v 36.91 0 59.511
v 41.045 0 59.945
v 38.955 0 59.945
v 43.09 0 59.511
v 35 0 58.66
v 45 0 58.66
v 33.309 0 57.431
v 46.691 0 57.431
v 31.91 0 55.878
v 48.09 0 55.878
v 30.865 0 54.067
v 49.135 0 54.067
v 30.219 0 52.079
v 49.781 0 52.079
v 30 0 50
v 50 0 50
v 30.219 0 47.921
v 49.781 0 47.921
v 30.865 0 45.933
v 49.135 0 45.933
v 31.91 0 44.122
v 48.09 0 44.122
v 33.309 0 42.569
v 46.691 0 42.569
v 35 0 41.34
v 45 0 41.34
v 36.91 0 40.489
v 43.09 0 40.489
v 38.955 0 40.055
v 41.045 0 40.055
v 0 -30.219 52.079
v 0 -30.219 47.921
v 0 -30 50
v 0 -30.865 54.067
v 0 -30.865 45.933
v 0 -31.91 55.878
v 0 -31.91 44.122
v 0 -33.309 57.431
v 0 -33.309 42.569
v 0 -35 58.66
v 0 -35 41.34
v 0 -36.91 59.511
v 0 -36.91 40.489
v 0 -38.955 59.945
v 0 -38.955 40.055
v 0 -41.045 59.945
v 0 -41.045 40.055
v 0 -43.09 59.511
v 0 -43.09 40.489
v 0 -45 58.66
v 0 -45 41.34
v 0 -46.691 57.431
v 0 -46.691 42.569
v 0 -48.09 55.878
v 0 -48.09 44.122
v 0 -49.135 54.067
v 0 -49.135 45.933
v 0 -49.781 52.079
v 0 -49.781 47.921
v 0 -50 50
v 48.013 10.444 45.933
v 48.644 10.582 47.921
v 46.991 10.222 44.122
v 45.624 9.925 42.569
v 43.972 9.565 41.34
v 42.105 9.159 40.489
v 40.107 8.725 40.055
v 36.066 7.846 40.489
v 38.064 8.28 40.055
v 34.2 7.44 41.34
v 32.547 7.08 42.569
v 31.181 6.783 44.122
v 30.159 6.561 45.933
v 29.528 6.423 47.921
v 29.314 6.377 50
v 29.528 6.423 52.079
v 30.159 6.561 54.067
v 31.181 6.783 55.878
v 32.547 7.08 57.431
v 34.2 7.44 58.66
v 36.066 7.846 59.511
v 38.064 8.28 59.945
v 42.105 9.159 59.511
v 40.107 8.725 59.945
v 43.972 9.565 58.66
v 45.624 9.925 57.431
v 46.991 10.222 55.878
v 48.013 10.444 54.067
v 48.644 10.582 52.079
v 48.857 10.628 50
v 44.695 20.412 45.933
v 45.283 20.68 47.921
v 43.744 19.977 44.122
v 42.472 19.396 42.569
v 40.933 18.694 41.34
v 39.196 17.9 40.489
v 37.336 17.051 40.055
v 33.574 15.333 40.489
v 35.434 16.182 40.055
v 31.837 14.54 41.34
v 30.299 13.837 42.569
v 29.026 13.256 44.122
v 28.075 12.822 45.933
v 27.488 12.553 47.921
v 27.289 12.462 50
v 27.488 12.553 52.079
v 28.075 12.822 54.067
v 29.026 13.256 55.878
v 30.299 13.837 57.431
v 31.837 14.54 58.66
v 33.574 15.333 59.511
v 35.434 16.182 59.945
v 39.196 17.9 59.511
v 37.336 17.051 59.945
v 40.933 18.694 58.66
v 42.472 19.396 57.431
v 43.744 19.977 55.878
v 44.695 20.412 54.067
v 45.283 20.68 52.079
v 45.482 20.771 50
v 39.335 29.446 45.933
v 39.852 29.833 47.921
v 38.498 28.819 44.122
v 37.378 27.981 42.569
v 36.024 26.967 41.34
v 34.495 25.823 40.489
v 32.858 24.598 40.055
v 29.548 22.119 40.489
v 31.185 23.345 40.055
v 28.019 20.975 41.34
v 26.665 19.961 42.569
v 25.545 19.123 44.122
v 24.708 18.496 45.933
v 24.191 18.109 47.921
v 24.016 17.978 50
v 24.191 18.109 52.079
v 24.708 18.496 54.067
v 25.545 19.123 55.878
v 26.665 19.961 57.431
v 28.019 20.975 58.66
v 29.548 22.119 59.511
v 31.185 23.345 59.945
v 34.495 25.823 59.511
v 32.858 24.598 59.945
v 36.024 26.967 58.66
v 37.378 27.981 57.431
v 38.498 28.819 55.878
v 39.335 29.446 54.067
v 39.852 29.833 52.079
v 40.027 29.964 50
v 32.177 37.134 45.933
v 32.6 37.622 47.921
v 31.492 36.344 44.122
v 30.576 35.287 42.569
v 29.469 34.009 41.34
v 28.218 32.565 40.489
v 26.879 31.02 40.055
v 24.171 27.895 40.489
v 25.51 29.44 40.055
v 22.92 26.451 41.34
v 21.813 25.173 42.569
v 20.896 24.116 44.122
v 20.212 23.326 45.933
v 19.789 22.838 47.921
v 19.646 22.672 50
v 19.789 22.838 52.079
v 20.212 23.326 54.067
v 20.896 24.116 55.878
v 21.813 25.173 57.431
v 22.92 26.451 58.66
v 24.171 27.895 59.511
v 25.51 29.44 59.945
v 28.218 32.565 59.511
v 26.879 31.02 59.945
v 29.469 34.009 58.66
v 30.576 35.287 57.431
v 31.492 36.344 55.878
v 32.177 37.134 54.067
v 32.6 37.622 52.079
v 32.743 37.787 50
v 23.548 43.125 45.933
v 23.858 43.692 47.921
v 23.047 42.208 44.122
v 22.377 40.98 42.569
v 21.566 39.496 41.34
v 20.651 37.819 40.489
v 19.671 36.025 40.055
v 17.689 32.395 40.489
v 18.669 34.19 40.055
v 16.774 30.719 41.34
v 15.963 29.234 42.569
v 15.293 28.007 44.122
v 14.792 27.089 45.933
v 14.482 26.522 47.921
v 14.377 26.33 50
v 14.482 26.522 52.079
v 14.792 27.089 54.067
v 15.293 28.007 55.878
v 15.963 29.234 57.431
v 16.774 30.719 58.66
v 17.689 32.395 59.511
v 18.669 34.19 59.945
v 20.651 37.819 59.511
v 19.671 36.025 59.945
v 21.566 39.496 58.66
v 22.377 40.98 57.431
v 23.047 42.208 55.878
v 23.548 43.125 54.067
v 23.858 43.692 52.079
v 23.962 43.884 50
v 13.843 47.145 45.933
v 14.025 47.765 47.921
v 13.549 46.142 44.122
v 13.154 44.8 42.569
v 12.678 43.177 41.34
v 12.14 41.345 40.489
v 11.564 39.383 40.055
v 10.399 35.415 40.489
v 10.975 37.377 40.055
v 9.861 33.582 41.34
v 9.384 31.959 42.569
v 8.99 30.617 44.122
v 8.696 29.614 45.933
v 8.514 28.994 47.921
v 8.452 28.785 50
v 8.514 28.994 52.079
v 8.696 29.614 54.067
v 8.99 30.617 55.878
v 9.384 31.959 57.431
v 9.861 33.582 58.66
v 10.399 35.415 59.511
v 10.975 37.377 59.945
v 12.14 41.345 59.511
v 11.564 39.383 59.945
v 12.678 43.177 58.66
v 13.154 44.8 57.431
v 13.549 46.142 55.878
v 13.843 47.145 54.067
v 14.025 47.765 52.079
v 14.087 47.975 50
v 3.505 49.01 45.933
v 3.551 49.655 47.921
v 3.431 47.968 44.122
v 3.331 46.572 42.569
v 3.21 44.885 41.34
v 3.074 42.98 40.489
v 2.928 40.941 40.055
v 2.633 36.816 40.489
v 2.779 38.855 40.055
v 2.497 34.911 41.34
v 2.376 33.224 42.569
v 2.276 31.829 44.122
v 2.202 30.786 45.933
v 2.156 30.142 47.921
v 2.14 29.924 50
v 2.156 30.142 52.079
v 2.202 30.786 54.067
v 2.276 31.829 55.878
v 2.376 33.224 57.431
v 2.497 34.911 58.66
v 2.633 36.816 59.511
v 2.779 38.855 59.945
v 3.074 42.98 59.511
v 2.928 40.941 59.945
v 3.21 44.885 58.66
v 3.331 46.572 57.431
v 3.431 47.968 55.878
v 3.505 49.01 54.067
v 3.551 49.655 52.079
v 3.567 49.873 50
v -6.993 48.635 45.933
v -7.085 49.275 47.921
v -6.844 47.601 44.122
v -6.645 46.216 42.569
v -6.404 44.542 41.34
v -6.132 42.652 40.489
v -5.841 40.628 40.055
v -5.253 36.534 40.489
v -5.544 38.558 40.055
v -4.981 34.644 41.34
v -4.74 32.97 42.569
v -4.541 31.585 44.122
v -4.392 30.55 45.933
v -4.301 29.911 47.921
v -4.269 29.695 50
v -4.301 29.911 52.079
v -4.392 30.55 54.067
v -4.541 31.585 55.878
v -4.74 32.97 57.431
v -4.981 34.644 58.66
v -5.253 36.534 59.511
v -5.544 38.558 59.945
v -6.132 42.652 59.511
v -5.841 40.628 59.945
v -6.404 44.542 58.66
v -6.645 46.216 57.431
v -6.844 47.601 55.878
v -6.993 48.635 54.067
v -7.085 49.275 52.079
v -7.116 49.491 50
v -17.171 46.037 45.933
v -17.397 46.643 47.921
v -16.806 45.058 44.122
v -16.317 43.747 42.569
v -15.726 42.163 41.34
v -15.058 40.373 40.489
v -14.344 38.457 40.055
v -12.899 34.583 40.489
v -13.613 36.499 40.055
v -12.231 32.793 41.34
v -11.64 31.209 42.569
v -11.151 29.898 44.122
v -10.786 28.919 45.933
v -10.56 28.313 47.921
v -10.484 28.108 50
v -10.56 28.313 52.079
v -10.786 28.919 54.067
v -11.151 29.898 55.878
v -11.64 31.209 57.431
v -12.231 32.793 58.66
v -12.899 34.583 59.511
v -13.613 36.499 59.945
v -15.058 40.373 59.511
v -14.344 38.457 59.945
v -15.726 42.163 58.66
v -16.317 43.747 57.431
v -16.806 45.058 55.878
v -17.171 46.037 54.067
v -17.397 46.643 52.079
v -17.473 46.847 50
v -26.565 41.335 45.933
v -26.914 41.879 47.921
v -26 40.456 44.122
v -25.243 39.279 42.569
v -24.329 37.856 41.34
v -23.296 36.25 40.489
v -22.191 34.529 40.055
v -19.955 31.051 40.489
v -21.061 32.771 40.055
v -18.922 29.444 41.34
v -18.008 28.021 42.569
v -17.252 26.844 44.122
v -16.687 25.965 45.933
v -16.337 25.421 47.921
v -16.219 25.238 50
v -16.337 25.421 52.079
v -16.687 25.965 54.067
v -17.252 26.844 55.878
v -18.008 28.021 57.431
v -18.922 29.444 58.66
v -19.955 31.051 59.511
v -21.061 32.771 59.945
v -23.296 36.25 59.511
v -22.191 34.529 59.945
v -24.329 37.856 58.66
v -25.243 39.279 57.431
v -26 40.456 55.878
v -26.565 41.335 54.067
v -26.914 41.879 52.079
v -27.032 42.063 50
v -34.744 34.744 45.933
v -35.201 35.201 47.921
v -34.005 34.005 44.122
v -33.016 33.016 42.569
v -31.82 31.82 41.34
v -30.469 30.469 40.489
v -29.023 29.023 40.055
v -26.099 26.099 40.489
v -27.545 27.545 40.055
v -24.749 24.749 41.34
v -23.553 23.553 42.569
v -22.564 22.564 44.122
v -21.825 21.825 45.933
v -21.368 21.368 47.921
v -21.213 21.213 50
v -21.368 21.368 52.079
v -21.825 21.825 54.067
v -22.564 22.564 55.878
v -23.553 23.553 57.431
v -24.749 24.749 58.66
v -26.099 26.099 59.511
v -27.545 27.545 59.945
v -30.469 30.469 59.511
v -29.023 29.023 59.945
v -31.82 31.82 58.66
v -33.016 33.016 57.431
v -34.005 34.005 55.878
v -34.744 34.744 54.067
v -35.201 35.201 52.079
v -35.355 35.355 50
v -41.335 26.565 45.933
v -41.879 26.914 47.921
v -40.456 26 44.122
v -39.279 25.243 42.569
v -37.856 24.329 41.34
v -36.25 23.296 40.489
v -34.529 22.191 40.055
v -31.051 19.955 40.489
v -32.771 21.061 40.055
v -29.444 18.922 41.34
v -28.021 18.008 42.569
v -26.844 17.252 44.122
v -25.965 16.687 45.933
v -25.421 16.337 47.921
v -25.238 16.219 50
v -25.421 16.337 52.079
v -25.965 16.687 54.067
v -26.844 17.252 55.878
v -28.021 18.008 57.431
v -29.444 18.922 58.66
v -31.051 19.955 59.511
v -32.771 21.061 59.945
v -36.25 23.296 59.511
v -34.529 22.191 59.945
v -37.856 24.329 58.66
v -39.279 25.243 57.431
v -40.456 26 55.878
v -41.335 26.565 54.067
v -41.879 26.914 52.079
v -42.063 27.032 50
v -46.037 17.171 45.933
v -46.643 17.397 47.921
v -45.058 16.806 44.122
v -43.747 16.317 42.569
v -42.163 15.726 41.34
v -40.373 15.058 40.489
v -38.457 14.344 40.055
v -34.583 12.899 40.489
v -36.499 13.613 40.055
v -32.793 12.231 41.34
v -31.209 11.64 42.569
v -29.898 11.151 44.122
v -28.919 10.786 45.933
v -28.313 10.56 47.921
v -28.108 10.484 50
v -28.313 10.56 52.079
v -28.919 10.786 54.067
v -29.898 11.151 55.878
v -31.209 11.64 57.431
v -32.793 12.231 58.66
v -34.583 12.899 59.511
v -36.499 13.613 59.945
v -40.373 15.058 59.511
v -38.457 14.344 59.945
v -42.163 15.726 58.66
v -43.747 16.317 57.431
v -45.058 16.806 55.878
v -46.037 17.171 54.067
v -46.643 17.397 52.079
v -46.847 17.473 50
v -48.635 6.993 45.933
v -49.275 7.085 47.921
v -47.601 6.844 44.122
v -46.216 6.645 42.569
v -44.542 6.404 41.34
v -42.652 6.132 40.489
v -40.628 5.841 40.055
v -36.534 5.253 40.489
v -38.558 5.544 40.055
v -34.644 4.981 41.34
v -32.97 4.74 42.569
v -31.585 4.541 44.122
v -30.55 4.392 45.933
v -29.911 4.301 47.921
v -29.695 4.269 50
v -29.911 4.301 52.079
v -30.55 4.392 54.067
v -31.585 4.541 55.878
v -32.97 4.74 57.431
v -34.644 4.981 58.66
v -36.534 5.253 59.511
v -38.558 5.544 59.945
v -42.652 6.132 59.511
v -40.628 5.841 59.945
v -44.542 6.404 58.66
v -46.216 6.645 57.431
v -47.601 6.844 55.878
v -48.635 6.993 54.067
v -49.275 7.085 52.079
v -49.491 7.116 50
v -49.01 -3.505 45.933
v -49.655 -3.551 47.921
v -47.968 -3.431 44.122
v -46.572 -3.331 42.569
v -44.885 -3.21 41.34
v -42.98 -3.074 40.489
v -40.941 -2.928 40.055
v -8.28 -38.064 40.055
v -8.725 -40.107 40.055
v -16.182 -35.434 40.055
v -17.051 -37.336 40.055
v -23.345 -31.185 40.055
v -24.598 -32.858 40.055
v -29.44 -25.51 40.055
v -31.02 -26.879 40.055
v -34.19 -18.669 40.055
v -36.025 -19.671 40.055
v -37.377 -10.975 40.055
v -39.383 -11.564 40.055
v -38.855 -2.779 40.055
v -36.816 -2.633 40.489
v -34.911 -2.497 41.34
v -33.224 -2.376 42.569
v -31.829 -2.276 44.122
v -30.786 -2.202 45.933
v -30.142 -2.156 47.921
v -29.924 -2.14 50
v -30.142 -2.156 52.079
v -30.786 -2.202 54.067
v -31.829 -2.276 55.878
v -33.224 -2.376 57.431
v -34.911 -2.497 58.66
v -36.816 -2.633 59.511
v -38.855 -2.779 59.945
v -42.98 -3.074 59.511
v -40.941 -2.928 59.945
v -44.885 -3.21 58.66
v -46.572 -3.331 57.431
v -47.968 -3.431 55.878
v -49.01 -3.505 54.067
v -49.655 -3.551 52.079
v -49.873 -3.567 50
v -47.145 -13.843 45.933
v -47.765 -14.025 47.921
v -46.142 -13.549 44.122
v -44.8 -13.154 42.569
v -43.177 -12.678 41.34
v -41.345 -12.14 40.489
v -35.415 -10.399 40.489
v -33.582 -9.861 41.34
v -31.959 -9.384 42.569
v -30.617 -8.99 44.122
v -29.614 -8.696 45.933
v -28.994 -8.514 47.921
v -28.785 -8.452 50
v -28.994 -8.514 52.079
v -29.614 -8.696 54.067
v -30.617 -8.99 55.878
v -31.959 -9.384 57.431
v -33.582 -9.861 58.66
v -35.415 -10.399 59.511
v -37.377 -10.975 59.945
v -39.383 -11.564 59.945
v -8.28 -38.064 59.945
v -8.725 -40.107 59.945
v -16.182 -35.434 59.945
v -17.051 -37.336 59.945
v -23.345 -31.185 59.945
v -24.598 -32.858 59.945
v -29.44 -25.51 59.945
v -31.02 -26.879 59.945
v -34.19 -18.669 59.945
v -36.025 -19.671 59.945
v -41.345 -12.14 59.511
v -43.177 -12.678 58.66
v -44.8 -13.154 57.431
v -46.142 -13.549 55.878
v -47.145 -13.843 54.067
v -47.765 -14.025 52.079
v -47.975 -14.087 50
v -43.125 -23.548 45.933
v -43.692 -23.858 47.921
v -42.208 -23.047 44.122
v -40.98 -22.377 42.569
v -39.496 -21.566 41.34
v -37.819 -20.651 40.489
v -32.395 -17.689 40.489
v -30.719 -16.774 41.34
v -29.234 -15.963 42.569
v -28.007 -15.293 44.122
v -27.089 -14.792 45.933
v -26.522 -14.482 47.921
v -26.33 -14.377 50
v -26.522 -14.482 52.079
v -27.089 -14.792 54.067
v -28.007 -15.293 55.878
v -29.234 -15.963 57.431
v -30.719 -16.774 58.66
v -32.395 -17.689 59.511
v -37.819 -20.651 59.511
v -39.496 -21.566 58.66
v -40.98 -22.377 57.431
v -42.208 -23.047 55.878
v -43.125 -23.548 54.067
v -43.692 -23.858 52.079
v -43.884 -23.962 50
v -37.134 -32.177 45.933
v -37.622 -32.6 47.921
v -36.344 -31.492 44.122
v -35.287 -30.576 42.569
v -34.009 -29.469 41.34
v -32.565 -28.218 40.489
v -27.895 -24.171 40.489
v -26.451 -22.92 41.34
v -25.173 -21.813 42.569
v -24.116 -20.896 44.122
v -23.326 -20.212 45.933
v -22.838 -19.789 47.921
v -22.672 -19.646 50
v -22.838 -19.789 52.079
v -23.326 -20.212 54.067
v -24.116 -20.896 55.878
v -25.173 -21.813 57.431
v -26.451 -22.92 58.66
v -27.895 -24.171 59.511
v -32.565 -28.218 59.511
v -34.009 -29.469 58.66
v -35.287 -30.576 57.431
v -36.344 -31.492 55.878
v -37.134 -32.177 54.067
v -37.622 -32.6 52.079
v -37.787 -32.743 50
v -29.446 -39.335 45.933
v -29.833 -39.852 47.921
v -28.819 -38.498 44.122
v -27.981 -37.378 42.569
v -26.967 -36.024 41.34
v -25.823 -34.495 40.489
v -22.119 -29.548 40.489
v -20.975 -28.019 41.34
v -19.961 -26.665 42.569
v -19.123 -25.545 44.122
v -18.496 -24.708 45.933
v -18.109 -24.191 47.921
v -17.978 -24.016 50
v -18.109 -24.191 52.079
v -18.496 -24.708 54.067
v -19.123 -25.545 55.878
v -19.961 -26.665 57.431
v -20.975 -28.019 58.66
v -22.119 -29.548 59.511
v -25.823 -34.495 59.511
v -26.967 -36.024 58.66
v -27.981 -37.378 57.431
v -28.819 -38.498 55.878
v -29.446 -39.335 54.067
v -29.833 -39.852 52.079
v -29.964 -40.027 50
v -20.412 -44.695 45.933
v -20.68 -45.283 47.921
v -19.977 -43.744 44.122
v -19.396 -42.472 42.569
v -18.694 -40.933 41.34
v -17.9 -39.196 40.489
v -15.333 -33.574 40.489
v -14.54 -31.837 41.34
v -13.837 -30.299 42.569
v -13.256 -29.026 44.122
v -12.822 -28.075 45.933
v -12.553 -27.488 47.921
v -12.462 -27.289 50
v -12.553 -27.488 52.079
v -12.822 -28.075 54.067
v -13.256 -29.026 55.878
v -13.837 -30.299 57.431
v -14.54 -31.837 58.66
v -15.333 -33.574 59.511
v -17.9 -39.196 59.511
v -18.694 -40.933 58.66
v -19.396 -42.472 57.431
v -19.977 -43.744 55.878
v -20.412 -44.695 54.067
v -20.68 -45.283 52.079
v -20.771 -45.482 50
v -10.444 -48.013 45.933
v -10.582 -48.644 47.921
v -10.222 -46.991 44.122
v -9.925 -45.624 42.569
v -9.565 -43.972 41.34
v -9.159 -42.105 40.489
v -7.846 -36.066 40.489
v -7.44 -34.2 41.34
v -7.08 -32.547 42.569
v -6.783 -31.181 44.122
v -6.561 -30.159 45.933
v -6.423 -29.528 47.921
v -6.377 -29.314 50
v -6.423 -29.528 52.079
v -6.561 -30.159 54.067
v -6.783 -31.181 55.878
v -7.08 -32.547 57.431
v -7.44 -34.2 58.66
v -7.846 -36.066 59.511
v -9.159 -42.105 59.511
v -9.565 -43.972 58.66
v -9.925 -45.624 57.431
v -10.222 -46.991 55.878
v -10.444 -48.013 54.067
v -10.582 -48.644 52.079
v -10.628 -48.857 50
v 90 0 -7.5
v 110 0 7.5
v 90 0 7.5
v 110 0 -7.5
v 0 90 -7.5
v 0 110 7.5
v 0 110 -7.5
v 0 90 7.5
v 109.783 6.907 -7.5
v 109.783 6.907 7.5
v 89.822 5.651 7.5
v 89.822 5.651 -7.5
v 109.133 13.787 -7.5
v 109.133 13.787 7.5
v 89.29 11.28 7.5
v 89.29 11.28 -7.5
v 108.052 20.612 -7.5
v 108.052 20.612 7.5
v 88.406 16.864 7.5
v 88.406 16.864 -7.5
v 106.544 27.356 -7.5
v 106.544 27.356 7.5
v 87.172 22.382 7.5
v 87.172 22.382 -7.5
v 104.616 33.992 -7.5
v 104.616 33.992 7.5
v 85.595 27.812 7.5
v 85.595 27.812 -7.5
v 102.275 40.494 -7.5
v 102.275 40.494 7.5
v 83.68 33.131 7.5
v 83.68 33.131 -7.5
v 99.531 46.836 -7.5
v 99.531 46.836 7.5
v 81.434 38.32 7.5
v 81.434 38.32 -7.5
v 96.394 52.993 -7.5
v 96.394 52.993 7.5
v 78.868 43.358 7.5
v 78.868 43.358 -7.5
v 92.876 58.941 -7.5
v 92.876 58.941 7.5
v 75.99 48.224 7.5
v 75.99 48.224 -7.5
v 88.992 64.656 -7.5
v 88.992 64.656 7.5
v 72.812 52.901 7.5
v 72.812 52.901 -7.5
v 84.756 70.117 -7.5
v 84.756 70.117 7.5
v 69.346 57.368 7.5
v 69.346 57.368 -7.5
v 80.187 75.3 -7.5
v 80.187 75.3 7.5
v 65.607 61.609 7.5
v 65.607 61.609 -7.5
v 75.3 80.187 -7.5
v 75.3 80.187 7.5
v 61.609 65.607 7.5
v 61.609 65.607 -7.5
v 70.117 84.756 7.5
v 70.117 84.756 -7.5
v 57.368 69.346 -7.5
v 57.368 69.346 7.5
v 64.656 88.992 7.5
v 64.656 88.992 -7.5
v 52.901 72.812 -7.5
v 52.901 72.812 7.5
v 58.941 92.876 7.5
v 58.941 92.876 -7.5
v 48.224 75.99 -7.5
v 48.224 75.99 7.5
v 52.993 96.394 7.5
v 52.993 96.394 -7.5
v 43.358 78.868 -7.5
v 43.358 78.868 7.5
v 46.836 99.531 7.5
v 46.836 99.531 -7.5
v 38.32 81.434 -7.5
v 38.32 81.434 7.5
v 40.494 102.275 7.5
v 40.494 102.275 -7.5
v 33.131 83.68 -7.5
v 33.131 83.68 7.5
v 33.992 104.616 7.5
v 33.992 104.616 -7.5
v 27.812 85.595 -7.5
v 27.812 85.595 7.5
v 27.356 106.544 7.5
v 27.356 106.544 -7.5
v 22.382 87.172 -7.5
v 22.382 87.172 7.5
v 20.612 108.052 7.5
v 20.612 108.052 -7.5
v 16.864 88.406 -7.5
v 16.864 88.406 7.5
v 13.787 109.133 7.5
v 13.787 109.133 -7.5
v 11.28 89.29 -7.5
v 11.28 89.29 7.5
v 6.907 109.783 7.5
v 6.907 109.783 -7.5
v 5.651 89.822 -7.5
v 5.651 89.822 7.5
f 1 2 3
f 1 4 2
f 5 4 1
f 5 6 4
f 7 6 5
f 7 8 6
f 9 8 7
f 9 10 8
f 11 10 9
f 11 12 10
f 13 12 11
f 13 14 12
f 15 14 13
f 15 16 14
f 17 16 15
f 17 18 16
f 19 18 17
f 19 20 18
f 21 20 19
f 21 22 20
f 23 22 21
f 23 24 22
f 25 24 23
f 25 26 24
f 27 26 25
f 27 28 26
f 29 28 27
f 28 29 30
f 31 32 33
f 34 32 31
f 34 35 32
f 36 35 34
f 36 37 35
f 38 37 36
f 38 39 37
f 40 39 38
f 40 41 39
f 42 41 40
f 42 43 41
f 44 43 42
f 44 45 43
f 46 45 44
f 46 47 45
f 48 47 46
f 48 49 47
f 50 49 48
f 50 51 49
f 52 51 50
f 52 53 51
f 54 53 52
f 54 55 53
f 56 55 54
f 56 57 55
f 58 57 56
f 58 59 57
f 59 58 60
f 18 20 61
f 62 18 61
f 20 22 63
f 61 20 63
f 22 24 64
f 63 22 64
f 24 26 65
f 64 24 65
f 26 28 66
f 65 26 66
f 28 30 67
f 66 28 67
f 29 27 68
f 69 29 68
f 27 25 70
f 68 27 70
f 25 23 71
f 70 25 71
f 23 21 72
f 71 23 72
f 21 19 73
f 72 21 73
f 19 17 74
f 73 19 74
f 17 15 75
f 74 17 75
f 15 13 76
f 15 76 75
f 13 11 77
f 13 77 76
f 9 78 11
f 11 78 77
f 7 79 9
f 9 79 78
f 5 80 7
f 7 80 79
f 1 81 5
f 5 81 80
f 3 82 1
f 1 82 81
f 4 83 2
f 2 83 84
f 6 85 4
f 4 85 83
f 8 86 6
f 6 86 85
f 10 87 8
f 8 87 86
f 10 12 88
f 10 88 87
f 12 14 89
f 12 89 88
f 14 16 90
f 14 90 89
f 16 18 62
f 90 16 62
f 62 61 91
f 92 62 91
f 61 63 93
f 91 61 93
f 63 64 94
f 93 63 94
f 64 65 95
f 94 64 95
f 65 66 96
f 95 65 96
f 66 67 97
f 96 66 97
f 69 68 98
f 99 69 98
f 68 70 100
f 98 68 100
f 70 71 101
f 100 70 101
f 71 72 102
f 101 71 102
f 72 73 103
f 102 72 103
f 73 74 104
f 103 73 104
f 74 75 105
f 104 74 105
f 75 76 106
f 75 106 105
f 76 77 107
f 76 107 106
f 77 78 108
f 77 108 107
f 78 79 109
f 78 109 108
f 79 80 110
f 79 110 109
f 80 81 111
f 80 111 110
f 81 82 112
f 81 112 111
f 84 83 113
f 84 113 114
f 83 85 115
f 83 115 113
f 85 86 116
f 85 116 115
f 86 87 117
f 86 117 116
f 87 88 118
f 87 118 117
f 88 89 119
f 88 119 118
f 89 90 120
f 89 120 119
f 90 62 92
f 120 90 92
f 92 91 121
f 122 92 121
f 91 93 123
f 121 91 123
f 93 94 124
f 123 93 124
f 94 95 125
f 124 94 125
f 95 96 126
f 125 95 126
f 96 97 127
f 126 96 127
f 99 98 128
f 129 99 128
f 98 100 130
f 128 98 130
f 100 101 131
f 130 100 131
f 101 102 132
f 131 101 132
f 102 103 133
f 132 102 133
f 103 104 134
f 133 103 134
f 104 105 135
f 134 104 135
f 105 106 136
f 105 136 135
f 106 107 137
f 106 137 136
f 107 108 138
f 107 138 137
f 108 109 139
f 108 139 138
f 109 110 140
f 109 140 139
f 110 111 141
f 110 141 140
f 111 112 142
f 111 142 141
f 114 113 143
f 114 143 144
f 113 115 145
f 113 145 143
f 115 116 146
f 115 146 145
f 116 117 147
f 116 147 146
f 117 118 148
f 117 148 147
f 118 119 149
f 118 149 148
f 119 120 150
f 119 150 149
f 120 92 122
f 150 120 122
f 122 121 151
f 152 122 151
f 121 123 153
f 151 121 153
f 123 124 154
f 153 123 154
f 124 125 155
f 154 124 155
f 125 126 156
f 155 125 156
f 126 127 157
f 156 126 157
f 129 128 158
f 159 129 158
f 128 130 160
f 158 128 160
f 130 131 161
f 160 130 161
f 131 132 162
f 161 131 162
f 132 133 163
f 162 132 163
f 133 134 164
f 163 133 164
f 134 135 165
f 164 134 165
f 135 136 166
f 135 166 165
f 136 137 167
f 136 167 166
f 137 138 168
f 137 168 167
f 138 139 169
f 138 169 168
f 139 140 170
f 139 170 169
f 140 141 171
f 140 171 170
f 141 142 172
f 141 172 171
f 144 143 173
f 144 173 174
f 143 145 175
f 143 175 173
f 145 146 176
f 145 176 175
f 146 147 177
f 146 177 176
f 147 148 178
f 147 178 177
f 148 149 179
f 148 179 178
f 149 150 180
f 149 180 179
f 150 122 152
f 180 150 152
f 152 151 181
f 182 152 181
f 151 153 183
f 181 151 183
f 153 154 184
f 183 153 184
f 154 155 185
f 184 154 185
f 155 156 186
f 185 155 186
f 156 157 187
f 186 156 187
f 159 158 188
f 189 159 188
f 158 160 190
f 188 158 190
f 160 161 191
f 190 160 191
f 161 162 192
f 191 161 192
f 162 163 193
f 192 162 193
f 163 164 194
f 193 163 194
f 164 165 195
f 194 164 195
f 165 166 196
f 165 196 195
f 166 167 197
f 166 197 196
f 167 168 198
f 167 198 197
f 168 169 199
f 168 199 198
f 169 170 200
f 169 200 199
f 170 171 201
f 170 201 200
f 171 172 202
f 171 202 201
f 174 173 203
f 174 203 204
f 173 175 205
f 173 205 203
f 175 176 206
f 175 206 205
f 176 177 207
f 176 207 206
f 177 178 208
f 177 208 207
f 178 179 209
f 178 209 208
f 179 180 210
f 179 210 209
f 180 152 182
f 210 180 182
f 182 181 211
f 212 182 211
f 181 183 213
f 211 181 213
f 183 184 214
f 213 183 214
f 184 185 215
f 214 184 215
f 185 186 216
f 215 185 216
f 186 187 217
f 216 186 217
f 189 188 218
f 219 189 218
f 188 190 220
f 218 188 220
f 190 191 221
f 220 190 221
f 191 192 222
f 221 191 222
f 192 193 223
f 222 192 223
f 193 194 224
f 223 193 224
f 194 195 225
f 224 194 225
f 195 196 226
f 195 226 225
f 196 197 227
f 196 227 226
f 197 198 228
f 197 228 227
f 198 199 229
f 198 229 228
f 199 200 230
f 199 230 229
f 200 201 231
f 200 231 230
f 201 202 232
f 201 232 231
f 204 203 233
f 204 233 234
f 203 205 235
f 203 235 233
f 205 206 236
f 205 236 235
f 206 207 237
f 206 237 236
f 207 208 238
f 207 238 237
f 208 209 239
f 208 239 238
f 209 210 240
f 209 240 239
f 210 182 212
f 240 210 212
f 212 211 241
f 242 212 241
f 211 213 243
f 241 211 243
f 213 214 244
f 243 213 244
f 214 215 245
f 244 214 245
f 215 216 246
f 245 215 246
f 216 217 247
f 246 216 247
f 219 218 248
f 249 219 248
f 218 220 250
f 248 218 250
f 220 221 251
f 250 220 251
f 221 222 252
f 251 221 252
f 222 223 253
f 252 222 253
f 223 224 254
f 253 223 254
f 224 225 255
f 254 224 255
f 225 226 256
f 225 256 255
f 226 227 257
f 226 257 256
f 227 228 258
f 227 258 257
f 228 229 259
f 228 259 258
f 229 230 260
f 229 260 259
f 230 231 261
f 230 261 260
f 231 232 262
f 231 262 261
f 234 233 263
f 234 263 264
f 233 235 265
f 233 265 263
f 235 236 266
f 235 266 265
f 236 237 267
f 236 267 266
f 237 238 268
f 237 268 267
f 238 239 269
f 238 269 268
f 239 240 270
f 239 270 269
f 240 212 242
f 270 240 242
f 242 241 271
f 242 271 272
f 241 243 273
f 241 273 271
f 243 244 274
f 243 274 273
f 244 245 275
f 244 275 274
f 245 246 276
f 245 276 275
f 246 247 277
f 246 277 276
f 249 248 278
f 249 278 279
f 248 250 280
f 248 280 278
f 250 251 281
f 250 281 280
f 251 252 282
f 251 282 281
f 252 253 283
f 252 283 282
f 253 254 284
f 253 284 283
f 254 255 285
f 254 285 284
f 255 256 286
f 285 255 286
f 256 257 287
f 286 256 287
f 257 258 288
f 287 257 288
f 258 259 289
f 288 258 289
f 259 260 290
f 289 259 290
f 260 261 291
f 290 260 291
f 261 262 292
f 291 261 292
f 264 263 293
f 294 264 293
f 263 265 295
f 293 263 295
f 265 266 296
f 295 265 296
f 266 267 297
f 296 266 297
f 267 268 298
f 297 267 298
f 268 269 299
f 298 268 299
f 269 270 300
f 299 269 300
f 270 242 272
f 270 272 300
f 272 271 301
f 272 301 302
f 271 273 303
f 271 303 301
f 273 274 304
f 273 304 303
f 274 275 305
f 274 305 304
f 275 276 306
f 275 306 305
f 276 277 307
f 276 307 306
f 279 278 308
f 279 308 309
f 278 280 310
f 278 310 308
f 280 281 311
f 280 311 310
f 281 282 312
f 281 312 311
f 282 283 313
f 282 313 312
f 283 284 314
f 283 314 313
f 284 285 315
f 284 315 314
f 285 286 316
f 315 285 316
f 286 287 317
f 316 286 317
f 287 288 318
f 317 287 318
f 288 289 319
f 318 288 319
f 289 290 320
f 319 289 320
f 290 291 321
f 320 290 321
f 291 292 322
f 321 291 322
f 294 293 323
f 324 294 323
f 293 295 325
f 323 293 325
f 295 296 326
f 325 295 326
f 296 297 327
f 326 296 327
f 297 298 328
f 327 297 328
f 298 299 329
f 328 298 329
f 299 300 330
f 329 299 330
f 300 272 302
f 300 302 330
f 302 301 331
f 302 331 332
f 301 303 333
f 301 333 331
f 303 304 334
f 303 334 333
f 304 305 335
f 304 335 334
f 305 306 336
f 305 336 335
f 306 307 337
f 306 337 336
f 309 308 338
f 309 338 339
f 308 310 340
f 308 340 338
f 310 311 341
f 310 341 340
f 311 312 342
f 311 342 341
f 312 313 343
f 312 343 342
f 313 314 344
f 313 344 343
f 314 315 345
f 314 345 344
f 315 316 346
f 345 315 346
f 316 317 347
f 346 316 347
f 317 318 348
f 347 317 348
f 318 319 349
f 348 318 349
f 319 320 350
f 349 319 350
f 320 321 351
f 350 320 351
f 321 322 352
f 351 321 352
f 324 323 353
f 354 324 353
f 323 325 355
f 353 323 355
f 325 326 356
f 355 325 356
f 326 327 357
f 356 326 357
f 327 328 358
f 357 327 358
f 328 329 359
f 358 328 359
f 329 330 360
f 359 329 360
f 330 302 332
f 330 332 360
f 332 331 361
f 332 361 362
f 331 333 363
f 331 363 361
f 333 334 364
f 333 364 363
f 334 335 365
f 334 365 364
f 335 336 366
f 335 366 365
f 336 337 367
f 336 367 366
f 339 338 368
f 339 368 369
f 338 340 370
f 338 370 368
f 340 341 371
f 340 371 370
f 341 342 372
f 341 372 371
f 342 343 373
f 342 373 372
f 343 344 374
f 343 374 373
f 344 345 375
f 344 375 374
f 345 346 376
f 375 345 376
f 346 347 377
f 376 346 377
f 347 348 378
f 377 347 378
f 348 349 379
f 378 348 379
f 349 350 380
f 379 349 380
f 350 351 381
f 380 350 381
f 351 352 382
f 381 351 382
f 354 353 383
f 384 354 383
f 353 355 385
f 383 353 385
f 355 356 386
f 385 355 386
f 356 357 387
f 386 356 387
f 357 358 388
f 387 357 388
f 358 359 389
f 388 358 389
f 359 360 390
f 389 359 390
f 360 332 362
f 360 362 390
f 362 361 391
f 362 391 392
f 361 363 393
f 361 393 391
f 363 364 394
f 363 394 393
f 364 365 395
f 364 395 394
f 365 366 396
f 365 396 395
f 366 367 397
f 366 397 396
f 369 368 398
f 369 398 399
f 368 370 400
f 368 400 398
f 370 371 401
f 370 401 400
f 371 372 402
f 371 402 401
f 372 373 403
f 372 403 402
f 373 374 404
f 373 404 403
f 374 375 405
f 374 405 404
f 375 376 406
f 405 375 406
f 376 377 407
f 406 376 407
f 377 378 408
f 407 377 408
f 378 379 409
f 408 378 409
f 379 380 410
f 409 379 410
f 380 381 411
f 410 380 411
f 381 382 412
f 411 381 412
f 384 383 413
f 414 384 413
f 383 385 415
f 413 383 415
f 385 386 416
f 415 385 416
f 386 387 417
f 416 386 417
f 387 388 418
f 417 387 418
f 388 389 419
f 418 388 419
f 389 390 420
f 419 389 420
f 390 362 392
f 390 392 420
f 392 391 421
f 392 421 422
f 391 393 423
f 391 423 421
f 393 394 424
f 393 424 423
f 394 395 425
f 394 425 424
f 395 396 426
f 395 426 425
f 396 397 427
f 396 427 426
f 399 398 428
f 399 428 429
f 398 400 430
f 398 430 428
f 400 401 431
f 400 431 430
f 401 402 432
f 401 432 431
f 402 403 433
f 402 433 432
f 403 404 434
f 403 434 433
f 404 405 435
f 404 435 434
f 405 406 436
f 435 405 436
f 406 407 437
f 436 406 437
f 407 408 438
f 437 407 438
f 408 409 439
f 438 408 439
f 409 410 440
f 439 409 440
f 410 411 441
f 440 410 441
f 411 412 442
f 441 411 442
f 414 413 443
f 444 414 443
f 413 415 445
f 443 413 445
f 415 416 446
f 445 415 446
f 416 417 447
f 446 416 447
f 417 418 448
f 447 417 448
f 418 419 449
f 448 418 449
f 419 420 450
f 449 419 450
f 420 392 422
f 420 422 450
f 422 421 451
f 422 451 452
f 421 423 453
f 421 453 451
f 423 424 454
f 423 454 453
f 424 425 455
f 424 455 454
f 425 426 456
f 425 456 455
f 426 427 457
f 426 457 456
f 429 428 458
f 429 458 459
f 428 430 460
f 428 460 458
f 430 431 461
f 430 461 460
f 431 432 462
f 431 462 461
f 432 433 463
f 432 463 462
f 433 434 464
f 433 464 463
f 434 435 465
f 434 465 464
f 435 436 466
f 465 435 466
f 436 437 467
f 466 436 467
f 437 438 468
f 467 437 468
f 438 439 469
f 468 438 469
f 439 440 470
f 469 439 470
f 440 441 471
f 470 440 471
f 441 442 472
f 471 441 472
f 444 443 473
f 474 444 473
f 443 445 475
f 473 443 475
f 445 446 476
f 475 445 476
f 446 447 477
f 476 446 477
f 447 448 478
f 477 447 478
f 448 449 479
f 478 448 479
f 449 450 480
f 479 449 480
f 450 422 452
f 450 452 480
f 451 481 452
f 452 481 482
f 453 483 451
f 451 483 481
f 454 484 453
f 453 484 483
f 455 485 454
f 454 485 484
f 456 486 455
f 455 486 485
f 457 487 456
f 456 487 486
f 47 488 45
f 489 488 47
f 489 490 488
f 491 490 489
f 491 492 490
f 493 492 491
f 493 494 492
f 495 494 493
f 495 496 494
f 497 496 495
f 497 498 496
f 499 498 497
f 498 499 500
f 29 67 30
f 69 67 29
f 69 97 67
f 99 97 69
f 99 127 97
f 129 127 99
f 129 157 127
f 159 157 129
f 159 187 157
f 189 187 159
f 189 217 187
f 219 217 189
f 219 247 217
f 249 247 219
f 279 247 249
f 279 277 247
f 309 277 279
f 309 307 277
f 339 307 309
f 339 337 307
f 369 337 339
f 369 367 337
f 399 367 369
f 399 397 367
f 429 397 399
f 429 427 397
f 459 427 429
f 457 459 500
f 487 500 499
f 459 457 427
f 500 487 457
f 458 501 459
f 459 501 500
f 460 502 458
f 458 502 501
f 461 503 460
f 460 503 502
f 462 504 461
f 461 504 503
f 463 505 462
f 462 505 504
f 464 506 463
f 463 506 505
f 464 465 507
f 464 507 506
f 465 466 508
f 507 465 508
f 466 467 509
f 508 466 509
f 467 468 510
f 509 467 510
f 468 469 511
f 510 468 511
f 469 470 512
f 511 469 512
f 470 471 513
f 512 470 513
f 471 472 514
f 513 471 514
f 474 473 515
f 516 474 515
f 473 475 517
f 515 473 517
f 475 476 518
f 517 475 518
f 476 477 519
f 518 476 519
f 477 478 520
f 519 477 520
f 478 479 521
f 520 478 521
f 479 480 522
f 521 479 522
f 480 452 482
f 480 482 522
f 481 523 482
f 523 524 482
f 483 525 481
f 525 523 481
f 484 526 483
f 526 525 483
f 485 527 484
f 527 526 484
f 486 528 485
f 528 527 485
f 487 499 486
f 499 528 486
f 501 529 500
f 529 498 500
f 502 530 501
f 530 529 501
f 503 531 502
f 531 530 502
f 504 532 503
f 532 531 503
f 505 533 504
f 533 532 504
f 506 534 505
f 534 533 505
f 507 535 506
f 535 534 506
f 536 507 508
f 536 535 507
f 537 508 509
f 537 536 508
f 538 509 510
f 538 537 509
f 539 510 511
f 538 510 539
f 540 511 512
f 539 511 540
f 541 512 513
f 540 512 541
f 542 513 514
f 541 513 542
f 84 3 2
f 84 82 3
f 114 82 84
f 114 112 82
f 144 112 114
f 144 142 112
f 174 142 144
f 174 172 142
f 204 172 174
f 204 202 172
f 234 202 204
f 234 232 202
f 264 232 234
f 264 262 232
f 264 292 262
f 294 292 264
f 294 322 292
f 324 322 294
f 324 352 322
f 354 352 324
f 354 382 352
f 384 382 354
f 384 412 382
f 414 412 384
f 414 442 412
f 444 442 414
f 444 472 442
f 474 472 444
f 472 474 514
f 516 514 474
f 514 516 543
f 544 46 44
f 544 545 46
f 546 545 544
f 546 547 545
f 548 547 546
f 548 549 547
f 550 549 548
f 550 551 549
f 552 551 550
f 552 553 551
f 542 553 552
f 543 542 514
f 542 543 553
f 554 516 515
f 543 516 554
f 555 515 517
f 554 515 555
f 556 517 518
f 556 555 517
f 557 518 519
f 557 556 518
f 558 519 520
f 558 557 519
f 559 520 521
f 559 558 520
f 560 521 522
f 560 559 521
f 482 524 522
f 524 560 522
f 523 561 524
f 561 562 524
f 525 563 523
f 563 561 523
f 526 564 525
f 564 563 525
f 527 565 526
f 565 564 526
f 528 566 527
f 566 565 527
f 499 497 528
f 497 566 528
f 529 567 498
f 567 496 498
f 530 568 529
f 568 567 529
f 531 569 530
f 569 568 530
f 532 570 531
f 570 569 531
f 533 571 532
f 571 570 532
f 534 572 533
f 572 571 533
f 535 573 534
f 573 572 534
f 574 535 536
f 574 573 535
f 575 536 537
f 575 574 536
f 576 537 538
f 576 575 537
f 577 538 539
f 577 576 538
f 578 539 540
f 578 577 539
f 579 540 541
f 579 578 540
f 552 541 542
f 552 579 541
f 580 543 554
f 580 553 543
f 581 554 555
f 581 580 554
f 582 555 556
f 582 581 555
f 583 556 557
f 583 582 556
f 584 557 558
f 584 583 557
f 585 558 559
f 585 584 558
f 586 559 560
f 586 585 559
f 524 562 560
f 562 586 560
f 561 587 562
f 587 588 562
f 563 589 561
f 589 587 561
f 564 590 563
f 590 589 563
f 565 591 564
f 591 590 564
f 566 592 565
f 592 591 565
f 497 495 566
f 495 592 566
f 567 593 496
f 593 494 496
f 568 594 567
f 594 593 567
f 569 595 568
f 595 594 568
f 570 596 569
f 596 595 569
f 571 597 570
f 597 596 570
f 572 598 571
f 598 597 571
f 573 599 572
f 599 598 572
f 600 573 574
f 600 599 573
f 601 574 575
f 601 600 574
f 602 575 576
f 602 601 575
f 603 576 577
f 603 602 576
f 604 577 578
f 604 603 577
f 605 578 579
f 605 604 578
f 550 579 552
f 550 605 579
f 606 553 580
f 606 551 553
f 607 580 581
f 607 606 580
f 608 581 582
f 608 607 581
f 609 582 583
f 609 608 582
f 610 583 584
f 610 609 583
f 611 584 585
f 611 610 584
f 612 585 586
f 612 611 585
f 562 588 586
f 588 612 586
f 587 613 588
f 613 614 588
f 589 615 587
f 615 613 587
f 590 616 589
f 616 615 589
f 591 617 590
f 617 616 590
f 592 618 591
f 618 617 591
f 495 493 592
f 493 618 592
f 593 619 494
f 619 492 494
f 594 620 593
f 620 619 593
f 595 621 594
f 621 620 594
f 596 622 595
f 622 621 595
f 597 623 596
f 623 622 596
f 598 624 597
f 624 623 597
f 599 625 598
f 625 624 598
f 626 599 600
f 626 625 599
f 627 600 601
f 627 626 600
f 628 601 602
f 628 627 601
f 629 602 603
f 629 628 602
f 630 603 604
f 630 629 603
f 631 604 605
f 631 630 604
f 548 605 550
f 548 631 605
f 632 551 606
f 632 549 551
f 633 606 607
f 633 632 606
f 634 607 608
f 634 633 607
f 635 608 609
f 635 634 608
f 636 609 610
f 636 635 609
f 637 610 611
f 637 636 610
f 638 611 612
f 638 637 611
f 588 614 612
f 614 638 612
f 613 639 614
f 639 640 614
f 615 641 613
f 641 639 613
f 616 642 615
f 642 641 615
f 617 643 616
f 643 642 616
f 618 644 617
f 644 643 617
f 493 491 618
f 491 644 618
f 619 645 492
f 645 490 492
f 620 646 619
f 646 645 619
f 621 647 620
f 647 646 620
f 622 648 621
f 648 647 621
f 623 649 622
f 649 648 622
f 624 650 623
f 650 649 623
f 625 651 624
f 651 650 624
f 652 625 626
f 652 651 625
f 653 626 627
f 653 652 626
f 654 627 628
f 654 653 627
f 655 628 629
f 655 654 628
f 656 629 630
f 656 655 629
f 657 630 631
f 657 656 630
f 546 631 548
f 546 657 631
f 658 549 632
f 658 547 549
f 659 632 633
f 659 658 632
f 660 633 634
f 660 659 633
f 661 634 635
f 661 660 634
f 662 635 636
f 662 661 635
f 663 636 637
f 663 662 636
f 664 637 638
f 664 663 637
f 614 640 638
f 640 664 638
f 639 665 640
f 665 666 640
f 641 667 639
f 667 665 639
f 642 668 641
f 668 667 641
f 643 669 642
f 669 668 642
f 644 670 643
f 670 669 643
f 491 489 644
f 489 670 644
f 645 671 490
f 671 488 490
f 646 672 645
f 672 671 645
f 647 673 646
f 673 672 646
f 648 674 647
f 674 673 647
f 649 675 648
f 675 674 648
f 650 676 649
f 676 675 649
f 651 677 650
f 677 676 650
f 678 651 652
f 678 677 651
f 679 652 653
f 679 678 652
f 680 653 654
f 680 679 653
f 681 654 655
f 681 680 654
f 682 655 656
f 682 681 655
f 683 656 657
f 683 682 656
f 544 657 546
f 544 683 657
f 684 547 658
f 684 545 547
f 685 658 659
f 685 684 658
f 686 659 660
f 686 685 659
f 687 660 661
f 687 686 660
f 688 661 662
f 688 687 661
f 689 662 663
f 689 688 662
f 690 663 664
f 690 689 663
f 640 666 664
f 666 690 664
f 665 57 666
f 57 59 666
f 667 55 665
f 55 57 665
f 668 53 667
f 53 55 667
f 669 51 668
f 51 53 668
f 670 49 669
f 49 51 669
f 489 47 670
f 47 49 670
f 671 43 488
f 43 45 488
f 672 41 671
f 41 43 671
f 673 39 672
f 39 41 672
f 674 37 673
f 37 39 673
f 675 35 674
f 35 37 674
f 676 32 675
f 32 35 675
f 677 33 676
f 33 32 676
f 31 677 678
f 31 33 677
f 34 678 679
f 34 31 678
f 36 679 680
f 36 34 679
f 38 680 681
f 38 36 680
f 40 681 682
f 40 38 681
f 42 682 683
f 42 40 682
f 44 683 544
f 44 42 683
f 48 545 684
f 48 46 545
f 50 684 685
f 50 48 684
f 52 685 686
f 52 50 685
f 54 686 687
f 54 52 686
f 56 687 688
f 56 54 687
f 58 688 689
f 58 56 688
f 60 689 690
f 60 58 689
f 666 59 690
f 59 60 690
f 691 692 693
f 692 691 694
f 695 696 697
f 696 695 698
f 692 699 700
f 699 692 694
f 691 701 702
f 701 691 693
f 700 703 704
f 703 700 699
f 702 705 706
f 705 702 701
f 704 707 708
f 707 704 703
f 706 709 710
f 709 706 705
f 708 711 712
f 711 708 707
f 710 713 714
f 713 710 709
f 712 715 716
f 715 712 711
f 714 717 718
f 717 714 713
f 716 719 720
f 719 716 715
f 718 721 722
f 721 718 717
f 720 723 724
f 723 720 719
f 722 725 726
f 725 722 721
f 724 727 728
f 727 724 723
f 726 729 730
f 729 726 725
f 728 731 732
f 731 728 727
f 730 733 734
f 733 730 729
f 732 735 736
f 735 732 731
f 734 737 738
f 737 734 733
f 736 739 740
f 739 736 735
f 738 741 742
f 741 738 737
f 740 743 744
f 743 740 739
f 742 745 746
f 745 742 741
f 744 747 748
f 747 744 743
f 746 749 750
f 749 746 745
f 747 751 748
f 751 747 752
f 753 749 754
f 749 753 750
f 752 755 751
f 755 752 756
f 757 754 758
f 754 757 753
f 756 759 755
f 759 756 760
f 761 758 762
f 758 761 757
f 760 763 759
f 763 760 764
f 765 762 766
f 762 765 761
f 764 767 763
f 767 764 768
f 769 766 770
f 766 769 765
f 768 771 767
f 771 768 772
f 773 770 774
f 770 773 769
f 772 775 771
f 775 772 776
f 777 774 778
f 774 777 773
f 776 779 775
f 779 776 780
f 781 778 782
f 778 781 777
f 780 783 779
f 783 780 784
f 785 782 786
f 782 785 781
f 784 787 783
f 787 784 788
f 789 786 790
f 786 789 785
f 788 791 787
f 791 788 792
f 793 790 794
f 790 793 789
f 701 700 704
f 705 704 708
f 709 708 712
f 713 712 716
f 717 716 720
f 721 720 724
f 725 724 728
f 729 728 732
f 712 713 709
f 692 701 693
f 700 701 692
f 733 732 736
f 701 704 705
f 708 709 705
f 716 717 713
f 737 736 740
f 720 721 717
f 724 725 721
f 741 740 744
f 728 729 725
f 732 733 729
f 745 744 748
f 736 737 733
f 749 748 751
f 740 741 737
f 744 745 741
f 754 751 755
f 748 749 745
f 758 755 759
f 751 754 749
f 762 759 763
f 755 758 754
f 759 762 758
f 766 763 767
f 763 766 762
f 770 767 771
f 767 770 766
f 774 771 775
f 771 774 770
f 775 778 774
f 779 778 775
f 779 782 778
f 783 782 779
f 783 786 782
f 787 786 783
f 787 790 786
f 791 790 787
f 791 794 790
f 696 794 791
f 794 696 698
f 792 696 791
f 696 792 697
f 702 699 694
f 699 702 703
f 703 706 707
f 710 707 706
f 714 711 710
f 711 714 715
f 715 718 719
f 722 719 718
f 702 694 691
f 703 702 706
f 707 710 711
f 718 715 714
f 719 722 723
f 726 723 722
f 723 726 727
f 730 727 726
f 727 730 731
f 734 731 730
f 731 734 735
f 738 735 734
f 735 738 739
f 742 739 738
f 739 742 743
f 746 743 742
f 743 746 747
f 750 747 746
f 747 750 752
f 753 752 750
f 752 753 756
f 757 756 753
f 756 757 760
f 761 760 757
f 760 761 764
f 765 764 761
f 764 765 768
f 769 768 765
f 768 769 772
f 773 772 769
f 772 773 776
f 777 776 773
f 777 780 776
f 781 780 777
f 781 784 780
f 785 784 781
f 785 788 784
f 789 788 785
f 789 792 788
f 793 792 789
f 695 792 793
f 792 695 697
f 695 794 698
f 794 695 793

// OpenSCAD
// Example below taken from https://en.wikibooks.org/wiki/OpenSCAD_User_Manual/Using_the_2D_Subsystem#rotate_extrude
eps = 0.01;
// translate([eps, 60, 0])
   rotate_extrude(angle=270, convexity=10)
       translate([40, 50]) circle(10);
// rotate_extrude(angle=90, convexity=10)
//    translate([20, 0]) circle(10);
// translate([20, eps, 0])
//    rotate([90, 0, 0]) cylinder(r=10, h=80+eps);

// Play around
// color("red") 
//    rotate_extrude(angle=270, convexity=10)
    // translate([25, 0]) circle(20);

// 90 deg rectangular bend
size = [20, 15];
color("red") rotate_extrude(angle=90, convexity=10, $fn=100) translate([100, 0]) square(size, true);
